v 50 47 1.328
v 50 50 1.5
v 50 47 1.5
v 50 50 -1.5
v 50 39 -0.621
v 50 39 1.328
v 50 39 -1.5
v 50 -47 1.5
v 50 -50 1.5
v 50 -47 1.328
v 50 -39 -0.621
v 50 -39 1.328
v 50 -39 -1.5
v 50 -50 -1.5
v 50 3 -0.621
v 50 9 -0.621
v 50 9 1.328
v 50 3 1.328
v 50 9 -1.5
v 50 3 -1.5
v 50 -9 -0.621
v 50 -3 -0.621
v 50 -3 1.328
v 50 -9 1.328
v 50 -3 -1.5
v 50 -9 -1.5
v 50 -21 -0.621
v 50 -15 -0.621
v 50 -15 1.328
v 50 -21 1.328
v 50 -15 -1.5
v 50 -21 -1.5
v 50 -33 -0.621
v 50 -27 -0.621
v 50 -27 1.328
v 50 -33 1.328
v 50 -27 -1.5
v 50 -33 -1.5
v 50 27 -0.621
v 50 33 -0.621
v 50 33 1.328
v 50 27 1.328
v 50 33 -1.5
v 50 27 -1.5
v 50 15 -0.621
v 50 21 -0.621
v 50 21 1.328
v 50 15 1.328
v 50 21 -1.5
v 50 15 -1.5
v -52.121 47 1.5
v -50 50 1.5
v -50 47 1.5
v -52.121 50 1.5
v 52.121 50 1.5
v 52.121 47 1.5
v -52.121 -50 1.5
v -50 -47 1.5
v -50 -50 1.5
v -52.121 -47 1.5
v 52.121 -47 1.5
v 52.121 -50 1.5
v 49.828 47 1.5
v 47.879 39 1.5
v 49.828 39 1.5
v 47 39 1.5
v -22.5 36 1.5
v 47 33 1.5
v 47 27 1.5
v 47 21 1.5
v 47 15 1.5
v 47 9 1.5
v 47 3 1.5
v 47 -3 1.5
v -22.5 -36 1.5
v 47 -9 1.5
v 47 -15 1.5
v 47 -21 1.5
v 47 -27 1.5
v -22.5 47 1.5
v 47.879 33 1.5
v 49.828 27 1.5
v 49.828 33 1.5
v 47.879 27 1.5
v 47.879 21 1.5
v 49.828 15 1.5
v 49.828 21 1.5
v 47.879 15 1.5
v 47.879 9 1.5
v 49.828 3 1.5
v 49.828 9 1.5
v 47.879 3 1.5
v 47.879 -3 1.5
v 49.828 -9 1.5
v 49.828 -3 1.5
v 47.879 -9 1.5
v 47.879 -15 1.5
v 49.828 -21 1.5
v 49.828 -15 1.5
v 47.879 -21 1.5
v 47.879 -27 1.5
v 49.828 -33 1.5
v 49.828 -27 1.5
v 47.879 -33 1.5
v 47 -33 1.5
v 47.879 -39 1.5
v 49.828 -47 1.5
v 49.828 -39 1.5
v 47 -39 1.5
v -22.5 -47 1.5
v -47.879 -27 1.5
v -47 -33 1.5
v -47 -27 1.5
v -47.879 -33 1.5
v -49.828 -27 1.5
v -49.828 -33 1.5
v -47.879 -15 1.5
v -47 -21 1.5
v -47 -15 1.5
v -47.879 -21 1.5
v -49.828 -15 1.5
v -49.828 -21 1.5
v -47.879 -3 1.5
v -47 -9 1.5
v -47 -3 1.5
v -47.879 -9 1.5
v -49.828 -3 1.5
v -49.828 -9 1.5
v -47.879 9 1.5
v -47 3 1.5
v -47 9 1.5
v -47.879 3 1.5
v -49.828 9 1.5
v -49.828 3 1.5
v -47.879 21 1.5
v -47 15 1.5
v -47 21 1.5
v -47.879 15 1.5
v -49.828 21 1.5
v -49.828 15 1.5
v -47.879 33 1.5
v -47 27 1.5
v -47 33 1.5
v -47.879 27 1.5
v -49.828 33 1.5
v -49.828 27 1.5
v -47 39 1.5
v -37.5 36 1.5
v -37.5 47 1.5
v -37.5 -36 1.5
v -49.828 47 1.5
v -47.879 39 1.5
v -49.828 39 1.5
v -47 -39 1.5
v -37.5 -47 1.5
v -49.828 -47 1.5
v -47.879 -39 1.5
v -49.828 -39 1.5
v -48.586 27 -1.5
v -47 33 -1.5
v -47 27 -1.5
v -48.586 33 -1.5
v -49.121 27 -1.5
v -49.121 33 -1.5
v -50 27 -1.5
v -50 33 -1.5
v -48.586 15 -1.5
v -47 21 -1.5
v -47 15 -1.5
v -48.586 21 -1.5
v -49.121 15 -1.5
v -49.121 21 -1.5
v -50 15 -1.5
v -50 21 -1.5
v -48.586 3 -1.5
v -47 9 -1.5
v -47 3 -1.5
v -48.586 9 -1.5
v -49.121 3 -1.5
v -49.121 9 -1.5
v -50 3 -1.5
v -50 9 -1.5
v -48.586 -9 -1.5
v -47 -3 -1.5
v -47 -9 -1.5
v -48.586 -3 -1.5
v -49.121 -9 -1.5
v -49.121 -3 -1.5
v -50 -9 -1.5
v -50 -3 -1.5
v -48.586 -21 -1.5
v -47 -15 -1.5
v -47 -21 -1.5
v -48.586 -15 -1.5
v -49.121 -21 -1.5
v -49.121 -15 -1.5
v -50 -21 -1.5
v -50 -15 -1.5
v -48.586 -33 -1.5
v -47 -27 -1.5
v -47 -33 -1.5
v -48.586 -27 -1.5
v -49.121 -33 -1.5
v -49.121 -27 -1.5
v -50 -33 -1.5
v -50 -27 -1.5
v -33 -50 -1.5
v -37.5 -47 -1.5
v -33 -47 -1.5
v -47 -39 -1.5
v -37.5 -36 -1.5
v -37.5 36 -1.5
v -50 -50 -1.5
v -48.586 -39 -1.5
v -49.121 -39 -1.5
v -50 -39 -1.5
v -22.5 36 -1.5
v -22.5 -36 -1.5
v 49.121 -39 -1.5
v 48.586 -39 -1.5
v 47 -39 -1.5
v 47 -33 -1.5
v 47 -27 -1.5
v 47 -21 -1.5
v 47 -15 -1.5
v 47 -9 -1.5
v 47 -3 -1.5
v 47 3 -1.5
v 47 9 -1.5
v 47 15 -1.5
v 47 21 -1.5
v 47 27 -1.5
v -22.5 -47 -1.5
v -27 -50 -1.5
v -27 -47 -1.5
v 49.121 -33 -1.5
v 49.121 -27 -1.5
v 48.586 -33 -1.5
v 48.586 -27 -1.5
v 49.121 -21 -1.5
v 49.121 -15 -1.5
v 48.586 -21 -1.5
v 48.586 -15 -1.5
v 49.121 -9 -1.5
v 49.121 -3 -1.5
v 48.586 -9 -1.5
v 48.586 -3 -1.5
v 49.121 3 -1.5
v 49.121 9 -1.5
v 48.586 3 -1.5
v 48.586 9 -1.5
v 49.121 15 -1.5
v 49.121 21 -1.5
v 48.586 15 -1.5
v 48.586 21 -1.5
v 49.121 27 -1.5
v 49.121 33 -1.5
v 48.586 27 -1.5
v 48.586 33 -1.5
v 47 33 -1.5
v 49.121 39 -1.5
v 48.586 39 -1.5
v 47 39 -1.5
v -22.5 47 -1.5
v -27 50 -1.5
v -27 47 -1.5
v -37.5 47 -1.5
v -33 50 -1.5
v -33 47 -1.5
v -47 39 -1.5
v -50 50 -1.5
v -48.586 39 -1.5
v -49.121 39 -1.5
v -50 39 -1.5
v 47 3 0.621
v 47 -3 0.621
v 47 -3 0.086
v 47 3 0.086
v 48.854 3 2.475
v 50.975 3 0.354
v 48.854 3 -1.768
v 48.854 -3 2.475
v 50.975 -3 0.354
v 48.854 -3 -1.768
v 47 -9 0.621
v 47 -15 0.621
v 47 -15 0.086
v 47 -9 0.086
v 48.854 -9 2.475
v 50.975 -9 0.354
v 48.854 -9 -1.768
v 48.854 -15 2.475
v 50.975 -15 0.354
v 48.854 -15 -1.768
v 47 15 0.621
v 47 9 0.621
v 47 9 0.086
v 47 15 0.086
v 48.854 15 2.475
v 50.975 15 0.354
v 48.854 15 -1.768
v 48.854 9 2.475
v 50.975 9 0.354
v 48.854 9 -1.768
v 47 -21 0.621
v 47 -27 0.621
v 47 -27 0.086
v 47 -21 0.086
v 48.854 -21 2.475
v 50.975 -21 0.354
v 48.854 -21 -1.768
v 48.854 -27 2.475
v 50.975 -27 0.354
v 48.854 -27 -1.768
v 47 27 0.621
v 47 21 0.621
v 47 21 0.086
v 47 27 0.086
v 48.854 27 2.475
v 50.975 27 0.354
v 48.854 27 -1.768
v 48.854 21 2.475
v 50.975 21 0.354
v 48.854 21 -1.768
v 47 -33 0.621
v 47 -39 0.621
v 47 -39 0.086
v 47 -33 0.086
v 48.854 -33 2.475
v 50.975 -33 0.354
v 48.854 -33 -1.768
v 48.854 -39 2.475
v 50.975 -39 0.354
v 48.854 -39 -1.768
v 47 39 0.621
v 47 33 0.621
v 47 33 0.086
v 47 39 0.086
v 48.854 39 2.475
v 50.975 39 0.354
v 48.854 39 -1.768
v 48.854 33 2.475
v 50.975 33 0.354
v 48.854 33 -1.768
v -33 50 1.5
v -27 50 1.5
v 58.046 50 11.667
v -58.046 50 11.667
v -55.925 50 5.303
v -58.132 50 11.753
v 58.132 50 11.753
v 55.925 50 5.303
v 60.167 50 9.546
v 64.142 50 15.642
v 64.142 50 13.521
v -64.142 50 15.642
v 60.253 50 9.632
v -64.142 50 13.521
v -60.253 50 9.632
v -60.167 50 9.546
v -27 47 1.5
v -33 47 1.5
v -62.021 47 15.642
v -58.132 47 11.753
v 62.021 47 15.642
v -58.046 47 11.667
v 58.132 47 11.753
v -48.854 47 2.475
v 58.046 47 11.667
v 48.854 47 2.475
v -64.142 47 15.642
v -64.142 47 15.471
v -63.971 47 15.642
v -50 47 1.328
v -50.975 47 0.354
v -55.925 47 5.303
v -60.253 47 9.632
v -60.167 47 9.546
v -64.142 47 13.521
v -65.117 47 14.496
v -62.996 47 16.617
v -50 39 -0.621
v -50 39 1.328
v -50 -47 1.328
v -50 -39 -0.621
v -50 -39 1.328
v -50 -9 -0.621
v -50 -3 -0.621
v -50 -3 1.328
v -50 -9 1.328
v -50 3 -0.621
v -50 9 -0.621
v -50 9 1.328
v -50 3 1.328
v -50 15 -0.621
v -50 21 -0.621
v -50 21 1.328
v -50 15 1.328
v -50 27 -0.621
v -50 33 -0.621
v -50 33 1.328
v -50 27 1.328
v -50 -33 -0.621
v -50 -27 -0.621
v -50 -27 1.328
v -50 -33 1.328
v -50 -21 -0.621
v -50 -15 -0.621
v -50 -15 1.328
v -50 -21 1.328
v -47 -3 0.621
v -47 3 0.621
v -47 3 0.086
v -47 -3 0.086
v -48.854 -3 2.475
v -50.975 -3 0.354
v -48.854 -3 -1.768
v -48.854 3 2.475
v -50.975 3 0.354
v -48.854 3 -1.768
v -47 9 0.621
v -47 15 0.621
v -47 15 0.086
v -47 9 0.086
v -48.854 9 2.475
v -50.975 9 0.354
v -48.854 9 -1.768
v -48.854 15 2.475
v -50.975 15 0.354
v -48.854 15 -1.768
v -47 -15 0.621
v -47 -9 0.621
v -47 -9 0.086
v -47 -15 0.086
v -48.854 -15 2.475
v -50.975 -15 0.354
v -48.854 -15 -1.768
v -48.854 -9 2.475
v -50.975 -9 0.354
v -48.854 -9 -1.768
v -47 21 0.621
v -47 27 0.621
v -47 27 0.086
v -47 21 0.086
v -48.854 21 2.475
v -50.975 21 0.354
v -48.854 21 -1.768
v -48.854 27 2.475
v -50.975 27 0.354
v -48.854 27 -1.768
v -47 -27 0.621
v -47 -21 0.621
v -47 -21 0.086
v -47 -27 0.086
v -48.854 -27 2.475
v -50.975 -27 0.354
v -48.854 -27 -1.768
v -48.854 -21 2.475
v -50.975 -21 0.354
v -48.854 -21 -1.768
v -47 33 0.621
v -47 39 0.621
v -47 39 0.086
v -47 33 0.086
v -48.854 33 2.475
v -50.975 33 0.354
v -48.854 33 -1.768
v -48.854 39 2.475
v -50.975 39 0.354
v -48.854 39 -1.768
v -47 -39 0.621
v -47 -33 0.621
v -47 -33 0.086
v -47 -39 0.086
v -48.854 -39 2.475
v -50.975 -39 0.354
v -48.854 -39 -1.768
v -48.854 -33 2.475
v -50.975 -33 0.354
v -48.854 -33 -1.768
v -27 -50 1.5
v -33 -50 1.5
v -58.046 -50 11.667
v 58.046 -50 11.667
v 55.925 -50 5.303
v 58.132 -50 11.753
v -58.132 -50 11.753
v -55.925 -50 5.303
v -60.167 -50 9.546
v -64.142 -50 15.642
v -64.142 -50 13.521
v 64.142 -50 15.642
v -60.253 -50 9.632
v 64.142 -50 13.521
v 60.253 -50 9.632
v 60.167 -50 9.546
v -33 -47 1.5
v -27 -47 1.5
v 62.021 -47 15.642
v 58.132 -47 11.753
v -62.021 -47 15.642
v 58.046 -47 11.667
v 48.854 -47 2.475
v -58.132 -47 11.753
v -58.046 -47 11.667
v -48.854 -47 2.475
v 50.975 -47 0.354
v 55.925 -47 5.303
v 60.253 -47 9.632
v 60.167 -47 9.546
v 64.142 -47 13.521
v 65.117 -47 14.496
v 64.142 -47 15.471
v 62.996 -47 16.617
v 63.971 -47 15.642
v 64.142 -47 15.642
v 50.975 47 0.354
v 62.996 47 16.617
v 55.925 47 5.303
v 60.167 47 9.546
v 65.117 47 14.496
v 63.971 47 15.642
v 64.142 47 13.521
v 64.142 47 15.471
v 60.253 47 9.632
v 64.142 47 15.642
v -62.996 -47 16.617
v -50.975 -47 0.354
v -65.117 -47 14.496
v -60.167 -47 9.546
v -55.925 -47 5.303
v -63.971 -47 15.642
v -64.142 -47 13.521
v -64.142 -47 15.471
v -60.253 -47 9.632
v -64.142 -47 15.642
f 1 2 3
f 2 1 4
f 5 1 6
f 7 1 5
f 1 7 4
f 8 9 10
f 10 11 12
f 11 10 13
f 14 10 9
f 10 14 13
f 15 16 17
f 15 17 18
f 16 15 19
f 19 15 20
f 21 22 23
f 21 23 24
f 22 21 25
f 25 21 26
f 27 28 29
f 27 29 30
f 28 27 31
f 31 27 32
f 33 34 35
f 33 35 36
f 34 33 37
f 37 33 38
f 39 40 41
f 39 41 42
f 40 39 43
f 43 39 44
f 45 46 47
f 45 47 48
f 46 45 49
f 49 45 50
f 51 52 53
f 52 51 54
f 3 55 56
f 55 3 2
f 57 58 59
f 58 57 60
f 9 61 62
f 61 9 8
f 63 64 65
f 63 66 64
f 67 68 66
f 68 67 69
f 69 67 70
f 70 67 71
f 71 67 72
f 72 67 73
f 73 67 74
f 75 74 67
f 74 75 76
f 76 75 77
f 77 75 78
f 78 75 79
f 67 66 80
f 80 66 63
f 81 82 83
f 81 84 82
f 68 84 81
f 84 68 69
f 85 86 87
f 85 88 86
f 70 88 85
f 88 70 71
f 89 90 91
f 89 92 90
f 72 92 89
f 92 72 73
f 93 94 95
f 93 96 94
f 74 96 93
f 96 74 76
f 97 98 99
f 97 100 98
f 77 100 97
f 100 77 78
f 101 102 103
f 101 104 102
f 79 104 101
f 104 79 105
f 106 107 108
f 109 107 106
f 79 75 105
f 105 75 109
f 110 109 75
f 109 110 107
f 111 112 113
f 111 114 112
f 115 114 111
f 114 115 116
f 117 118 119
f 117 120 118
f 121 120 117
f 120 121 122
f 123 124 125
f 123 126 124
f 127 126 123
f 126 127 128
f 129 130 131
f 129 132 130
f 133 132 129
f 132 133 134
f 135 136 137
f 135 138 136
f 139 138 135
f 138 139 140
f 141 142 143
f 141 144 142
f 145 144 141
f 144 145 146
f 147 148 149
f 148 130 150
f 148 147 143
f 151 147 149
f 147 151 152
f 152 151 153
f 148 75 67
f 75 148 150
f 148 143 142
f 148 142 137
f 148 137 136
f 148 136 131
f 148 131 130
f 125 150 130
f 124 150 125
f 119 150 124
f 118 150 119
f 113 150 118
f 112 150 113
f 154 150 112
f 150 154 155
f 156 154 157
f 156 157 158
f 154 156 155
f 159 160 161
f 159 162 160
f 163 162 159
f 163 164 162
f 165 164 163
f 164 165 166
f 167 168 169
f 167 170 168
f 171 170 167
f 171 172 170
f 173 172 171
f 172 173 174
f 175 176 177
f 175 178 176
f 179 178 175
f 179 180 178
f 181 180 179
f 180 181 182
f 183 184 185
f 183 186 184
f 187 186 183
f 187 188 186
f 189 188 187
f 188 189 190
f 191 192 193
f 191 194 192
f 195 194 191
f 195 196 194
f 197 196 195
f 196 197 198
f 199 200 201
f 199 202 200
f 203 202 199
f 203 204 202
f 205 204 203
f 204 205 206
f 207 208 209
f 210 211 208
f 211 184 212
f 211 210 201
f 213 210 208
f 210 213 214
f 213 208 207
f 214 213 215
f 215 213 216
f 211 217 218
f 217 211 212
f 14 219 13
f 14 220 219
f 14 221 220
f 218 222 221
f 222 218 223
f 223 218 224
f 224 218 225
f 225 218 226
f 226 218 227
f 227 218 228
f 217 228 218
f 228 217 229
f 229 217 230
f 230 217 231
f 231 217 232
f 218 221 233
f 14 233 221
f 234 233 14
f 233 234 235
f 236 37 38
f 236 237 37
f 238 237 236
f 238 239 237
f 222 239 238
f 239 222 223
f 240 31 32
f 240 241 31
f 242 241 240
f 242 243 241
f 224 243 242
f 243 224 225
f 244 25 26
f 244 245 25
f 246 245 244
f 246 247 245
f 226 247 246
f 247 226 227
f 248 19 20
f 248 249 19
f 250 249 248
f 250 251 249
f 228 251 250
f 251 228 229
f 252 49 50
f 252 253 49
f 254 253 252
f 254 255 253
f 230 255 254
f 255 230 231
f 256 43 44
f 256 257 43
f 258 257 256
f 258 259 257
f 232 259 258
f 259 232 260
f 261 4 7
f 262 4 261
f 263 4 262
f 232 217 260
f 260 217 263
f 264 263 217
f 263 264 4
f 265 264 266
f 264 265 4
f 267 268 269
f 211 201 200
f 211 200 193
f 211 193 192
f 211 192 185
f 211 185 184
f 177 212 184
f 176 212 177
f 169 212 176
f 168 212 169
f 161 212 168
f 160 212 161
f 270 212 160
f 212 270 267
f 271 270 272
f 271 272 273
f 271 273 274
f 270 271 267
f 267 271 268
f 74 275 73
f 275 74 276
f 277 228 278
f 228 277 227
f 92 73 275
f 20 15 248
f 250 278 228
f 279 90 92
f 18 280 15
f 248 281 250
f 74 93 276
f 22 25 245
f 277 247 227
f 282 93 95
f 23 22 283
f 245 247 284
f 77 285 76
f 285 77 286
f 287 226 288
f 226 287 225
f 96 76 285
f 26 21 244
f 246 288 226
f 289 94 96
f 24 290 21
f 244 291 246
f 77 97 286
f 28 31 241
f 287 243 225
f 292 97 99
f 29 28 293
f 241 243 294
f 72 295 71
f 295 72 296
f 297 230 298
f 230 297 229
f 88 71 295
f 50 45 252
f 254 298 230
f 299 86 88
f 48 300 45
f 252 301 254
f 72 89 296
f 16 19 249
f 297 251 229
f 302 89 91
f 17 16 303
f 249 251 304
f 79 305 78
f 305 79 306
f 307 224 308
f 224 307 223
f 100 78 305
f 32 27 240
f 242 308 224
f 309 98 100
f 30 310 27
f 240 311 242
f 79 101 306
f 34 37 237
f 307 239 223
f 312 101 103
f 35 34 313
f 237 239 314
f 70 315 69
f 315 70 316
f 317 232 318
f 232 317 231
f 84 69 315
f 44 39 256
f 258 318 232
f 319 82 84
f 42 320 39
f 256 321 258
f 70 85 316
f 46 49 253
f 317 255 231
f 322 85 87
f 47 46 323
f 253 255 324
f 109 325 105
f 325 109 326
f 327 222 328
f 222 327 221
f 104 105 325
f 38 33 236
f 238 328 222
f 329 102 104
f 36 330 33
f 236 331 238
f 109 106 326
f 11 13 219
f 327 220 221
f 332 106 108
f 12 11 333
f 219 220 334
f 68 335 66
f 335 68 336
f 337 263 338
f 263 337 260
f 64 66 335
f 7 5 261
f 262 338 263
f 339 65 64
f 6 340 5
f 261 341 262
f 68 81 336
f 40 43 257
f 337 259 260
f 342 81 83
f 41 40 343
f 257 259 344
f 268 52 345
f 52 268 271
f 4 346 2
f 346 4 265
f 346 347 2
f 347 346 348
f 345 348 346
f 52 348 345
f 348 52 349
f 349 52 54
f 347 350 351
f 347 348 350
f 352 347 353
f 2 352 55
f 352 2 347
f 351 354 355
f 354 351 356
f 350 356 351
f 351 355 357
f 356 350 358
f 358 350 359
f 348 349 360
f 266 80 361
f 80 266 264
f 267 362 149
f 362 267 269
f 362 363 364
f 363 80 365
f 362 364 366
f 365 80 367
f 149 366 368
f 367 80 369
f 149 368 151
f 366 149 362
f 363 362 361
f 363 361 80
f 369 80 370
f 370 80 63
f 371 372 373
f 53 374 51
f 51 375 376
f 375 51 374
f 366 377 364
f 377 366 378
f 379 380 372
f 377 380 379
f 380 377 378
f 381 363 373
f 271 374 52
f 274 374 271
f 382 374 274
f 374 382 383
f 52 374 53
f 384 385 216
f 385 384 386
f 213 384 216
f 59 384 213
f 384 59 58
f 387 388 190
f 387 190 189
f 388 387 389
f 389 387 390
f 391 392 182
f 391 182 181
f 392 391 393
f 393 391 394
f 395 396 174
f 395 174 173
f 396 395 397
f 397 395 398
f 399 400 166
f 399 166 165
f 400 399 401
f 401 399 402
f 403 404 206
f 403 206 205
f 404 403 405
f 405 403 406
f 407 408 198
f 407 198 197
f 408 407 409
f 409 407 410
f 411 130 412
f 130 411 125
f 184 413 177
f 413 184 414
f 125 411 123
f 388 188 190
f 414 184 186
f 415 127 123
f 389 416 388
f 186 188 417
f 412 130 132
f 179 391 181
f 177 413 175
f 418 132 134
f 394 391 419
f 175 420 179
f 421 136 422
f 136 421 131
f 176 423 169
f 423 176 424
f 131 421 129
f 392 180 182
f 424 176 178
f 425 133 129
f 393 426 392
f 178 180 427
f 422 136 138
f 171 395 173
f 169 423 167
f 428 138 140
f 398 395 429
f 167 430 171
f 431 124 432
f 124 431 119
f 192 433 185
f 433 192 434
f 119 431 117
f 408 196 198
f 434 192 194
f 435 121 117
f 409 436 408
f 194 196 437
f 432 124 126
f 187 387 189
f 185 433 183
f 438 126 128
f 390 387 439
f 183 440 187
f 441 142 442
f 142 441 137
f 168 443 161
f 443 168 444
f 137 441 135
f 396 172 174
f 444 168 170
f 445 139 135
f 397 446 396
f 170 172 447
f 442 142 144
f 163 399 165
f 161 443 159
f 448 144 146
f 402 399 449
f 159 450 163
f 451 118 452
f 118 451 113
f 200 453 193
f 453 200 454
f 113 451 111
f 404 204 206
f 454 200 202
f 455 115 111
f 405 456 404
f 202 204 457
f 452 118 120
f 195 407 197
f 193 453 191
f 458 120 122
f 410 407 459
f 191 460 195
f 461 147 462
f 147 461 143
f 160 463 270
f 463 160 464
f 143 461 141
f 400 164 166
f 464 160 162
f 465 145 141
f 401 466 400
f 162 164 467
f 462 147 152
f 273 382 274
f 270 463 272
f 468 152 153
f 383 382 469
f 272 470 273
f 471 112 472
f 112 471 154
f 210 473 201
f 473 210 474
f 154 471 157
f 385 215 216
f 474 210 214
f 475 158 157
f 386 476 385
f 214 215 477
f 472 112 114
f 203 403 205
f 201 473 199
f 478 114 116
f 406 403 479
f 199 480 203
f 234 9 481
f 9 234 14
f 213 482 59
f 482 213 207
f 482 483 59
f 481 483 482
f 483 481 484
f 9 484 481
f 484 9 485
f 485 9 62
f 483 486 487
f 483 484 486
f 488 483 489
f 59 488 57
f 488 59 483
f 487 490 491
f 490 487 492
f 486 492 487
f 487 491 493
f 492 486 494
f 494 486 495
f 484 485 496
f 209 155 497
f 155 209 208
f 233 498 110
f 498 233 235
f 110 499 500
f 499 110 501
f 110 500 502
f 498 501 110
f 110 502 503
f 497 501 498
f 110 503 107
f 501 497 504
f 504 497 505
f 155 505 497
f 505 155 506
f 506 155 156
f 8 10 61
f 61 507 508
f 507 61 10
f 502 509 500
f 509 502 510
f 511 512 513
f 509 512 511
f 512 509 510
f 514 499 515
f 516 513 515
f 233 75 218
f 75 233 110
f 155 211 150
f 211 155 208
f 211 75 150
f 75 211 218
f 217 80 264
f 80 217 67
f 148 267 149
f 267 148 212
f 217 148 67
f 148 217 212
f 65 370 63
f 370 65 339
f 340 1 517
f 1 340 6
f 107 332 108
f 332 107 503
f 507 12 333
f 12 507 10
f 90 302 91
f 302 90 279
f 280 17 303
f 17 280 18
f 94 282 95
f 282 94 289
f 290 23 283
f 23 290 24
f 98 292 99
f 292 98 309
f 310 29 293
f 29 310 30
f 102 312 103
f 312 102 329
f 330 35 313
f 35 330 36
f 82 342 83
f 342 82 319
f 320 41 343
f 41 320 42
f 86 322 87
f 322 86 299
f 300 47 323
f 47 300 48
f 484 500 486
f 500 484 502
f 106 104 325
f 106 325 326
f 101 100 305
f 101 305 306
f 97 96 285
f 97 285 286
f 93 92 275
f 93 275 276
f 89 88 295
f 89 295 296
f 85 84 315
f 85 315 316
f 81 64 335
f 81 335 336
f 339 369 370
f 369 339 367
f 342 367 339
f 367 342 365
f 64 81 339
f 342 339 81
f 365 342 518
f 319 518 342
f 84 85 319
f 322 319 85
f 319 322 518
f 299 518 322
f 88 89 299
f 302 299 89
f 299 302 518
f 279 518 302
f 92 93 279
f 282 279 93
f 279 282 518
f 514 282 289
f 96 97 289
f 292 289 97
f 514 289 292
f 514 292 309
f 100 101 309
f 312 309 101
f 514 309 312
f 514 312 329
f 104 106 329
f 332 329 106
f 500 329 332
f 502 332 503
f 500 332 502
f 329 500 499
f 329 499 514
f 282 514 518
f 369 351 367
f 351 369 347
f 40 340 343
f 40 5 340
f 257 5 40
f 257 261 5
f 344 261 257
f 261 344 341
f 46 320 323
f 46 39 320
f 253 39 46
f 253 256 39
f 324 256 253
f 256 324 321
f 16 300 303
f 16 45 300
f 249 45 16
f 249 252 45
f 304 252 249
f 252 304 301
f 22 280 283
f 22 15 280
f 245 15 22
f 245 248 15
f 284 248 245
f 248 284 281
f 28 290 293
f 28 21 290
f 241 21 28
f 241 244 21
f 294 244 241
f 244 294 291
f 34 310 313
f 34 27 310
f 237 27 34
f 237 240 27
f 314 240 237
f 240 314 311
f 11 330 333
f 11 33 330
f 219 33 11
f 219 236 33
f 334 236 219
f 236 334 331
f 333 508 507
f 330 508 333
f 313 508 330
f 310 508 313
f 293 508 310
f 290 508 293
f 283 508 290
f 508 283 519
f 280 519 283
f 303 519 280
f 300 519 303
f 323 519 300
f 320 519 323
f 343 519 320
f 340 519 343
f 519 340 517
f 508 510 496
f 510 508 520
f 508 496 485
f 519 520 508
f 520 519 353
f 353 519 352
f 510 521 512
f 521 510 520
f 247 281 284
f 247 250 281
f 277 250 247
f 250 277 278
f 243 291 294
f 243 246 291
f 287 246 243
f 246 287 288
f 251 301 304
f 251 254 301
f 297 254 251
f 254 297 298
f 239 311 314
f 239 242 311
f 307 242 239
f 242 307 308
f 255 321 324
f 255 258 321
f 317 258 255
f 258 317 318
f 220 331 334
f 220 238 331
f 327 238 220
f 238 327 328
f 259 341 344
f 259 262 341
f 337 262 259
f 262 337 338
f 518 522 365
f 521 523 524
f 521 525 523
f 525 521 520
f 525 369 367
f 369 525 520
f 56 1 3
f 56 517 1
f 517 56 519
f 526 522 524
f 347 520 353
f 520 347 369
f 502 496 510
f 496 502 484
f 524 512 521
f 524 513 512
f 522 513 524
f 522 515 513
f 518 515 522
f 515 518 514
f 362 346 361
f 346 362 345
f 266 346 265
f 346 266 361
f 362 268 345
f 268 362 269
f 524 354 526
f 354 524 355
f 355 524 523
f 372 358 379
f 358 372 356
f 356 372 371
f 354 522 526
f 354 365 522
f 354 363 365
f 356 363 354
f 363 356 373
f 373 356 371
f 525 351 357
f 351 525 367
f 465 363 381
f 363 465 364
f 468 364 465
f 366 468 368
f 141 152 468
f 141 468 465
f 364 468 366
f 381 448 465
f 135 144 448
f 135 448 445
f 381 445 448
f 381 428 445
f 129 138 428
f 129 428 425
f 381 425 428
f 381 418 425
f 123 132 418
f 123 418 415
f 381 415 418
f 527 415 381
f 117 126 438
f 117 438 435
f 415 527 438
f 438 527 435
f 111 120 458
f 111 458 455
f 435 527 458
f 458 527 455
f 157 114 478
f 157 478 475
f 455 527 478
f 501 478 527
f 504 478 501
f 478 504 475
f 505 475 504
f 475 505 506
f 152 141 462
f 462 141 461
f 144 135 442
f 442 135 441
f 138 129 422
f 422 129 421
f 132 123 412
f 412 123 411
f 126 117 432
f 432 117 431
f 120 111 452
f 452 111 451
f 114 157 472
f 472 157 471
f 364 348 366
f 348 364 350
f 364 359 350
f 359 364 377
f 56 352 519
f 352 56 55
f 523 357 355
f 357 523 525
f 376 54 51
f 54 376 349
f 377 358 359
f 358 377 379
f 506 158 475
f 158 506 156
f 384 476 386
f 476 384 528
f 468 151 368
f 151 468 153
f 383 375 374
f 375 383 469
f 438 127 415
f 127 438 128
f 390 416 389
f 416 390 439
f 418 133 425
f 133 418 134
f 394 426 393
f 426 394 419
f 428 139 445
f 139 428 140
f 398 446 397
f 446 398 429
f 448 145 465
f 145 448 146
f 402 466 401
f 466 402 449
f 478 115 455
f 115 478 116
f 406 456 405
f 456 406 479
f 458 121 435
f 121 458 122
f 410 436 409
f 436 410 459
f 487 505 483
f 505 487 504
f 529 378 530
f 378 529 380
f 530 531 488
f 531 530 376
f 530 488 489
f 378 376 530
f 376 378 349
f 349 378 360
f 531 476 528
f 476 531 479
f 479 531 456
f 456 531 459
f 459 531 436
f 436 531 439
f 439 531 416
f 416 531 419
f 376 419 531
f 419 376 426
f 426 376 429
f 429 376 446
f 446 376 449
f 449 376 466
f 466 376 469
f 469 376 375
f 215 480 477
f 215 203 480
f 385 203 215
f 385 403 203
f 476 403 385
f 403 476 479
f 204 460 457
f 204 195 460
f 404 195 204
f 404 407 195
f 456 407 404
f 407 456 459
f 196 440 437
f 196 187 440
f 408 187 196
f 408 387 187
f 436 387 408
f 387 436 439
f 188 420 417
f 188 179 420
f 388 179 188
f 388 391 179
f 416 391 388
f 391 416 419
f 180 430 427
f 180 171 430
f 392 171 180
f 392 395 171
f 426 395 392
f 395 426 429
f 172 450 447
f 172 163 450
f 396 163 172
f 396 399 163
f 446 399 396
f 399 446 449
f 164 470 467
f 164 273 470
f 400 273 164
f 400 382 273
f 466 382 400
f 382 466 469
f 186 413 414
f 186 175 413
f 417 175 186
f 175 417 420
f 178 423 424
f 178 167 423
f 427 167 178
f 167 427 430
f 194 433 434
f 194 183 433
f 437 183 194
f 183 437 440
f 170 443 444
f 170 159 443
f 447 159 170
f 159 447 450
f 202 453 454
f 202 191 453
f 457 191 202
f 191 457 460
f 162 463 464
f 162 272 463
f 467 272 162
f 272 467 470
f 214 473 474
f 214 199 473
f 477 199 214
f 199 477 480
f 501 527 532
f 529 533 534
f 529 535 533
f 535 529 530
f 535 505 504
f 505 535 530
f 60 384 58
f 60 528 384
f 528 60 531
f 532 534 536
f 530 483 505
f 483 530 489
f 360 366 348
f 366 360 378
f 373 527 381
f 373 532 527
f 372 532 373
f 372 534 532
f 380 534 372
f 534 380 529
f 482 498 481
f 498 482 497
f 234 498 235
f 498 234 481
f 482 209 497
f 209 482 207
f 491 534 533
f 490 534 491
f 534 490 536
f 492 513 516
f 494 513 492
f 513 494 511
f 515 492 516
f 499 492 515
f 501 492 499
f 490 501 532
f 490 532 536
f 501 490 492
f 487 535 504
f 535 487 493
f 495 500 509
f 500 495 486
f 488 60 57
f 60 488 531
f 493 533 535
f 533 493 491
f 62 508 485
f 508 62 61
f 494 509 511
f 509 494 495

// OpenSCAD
IN_MM = 25.4;

th = 3;
frame_l = 100;
flap_w = 20;
wing_l = frame_l / 2;
corner_r = 5;
hole_ir = 3/2;
FOLD_DEG = 45;

mesh_hole = 10;
mesh_wall = 3;
mesh_dx = 1.5 * mesh_hole + mesh_wall;
mesh_dy = mesh_hole * cos(30) + mesh_wall;

chain_h = 11; // at smallest point
chain_w = 15; 

num_frames = 18;

finger_l = 3;
finger_w = 6;

m3_d = 2.5;
m3_w = 5.5;

module mesh() {
    difference() {
        square([frame_l - finger_l*2, frame_l - finger_l*2], center=true);
        for (x=[
                -frame_l/2:
                mesh_dx:
                frame_l/2 + mesh_dx]) {
            for (y=[
                    -frame_l/2:
                    mesh_dy:
                    frame_l/2 + mesh_dy]) {
                translate([x, y, 0]) {
                    // % cube([mesh_hole, mesh_hole, 2*th], center=true);
                    circle(r=mesh_hole/2, $fn=6);
                }
                translate([
                        x + mesh_dx/2, 
                        y - mesh_dy/2, 0]) {
                    circle(r=mesh_hole/2, $fn=6);
                    // % cube([mesh_hole, mesh_hole, 2*th], center=true);
                }
            }
        }
        projection()
            offs_chain_holes();
    }
}

// ! mesh();

module evolution_1() {
    scale([0.175, 0.175, 1.1])
    linear_extrude(th, center=true)
        translate([-820, -500])
        import("evolution_1b.dxf");
}

// evolution_1();

module evolution_2() {
    scale([0.1, 0.08, 1.1])
    rotate([0, 0, 40])
    linear_extrude(th, center=true)
        translate([-700, -420])
        import("evolution_2c.dxf");
}

// evolution_2();

module evolution_3() {
    scale([0.125, 0.125, 1.1])
    linear_extrude(th+1, center=true)
        translate([-820, -480])
        import("evolution_3b.dxf");
}

// ! projection() evolution_3();

module evolution_4() {
    scale([0.175, 0.175, 1.1])
    linear_extrude(th, center=true)
        translate([-830, -480])
        import("evolution_4b.dxf");
}

// ! evolution_4();

module evolution_4_5() {
    scale([0.25, 0.25, 1.1])
    linear_extrude(th, center=true)
        translate([-230, -200])
        import("evolution_4_5.dxf");
}

// ! evolution_4_5();

module evolution_5() {
    scale([0.15, 0.15, 1.1])
    linear_extrude(th, center=true)
        translate([-830, -460])
        import("evolution_5b.dxf");
}

// ! evolution_5();

module evolution_5_5() {
    scale([0.2, 0.2, 1.1])
    linear_extrude(th, center=true)
        translate([-150, -260])
        import("evolution_5_5.dxf");
}

// ! evolution_5_5();

module evolution_6() {
    scale([0.09, 0.09, 1.1])
    linear_extrude(th, center=true)
        translate([-820, -500])
        import("evolution_6b.dxf");
}

// ! evolution_6();

module evolution_7() {
    scale([0.08, 0.08, 1.1])
    linear_extrude(th, center=true)
        translate([-850, -500])
        import("evolution_7b.dxf");
}

// ! evolution_7();

module evolution_7_5() {
    scale([0.115, 0.115, 1.1])
    linear_extrude(th, center=true)
        translate([-420, -200])
        import("evolution_7_5.dxf");
}

// ! evolution_7_5();

module evolution_8() {
    scale([0.07, 0.07, 1.1])
    linear_extrude(th, center=true)
        translate([-850, -500])
        import("evolution_8b.dxf");
}

// ! evolution_8();

module evolution_9() {
    scale([0.075, 0.075, 1.1])
    linear_extrude(th, center=true)
        translate([-800, -500])
        import("evolution_9.dxf");
}

// ! evolution_9();

module evolution_10() {
    scale([0.09, 0.09, 1.1])
    linear_extrude(th, center=true)
        translate([-820, -500])
        import("evolution_10b.dxf");
}

// ! evolution_10();

module evolution_10_5() {
    scale([0.12, 0.12, 1.1])
    linear_extrude(th, center=true)
        translate([-440, -250])
        import("evolution_10_5.dxf");
}

// ! evolution_10_5();

module evolution_11() {
    scale([0.125, 0.125, 1.1])
    linear_extrude(th, center=true)
        translate([-820, -550])
        import("evolution_11b.dxf");
}

// ! evolution_11();

module evolution_12() {
    scale([0.07, 0.07, 1.1])
    linear_extrude(th, center=true)
        translate([-840, -500])
        import("evolution_12b.dxf");
}

// evolution_12();

module evolution_13() {
    scale([0.1, 0.1, 1.1])
    linear_extrude(th, center=true)
        translate([-820, -475])
        import("evolution_13d.dxf");
}

// evolution_13();

module evolution_14() {
    scale([0.12, 0.12, 1.1])
    linear_extrude(th, center=true)
        translate([-840, -450])
        import("evolution_14b.dxf");
}

// evolution_14();

module get_dxf(f=1) {
    if (f <= 1)
        evolution_1();
    else if (f <= 2)
        evolution_2();
    else if (f <= 3)
        evolution_3();
    else if (f <= 4)
        evolution_4();
    else if (f <= 4.5)
        evolution_4_5();
    else if (f <= 5)
        evolution_5();
    else if (f <= 5.5)
        evolution_5_5();
    else if (f <= 6)
        evolution_6();
    else if (f <= 7)
        evolution_7();
    else if (f <= 7.5)
        evolution_7_5();
    else if (f <= 8)
        evolution_8();
    else if (f <= 9)
        evolution_9();
    else if (f <= 10)
        evolution_10();
    else if (f <= 10.5)
        evolution_10_5();
    else if (f <= 11)
        evolution_11();
    else if (f <= 12)
        evolution_12();
    else if (f <= 13)
        evolution_13();
    else if (f <= 14)
        evolution_14();
    
}

// get_dxf();

// module flap_holes() {
//     // for (x=[flap_w:flap_w:wing_l - flap_w]) {
//     translate([wing_l - flap_w/2, flap_w/2, 0])
//         cylinder(r=hole_ir, h=2*th, center=true, $fn=64);
//     // }
// }

// module frame_wing_flap(fold_deg=FOLD_DEG) {
//     flap_deg = fold_deg == 0 ? 0 : 35;
//     difference() {
//         translate([0, 0, -th/2])
//             cube([wing_l, frame_l, th], center=false);
//         translate([0, 0, -th])
//             rotate([0, 0, 60])
//             cube([wing_l*2, frame_l, th*2], center=false);
//         translate([wing_l, 0, -th])
//             rotate([0, 0, 30])
//             cube([wing_l*2, frame_l*2, th*2], center=false);
//     }
//     rotate([flap_deg, 0, 60])
//         difference() {
//             translate([0, 0, -th/2])
//                 cube([wing_l, flap_w, th], center=false);
//             rotate([0, 0, 30])
//                 translate([0, -1, -th])
//                 cube([wing_l, flap_w, 2*th], center=false);
            
//             for (x=[20:20:wing_l]) {
//                 translate([x, 0, -th])
//                 cube([5, 1, th * 2]);
//             }
//             flap_holes();
//             // # rotate([0, 0, 0])
//             //     cube([chain_w, chain_h, 100], center=true);
//         }
    
// }

// ! frame_wing_flap();
// ! frame_wing_flap(fold_deg=0);

// module frame_wing_folded(fold_deg=FOLD_DEG) {
//     wing_deg = fold_deg == 0 ? 0 : 35;
//     difference() {
//         translate([0, 0, -th/2])
//             cube([wing_l, frame_l, th], center=false);
//         flap_holes();
//         for (y=[20:20:frame_l]) {
//             translate([0, y, -th])
//             cube([1, 5, th * 2]);
//         }
//         for (x=[20:20:wing_l]) {
//             translate([x, frame_l - 1, -th])
//                 cube([5, 1, th * 2]);
//         }
//     }
//     translate([0, frame_l, 0])
//         rotate([wing_deg, 0, 0])
//         frame_wing_flap(fold_deg=fold_deg);
// }

// ! frame_wing_folded();
// ! frame_wing_folded(fold_deg=0);

module fingers(l=frame_l/2 - finger_w * 2) {
    for (y=[
            0:
            2 * finger_w:
            l]) {
        for (i=[-1, 1])
            translate([0, i * y, 0])
                cube([finger_l, finger_w, th], center=true);
    }
}

module frame_fingers() {
    for (r=[0:90:359]) {
        rotate([0, 0, r])
            translate([frame_l/2 - finger_l/2, 0, 0])
            fingers();
    }
}

module chain_holes() {
    for (i=[-1, 1, -1.2, 1.2])
        translate([0, i * (frame_l/2 - chain_h/2 - finger_l), 0])
        cube([chain_w, chain_h, th], center=true);
}

module frame_wing() {
    fingers();
    translate([finger_l/2 + flap_w/2, 0, 0])
        cube([flap_w, frame_l - finger_l*2, th], center=true);

    translate([finger_l/2 + flap_w/2, frame_l / 2 - finger_l/2, 0])
        rotate([0, 0, 90])
        fingers(flap_w - finger_w * 2);
    translate([finger_l/2 + flap_w/2, -frame_l / 2 + finger_l/2, 0])
        rotate([0, 0, 90])
        fingers(flap_w - finger_w * 2);
}

// ! projection()
    // frame_wing();

module frame_cap() {
    difference() {
        union() {
            rotate([0, 0, 90])
                fingers();
            translate([0, finger_l/2 + flap_w/ sqrt(2)/2, 0])
                cube([
                    frame_l + flap_w * sqrt(2), 
                    flap_w / sqrt(2), th], center=true);
        }
        translate([frame_l/2 + th / sqrt(2), finger_l/2, -th])
            rotate([0, 0, -45])
            cube([flap_w*2, flap_w*2, th*2]);
        translate([
                frame_l/2 + flap_w * sqrt(2)/4, 
                finger_l/2 + flap_w * sqrt(2)/4, 0])
            rotate([0, 0, -45])
            fingers(flap_w - finger_w * 2);
        

        translate([
                -frame_l/2 - th / sqrt(2), 
                finger_l/2, -th])
            rotate([0, 0, 135])
            cube([flap_w*2, flap_w*2, th*2]);
        translate([
                -frame_l/2 - flap_w * sqrt(2)/4, 
                finger_l/2 + flap_w * sqrt(2)/4, 0])
            rotate([0, 0, 45])
            fingers(flap_w - finger_w * 2);
    }
}

// ! projection()
    // frame_cap();

module offs_chain_holes() {
    translate([-frame_l/2 + flap_w, 0, 0])
        chain_holes();
}

module frame_base() {
    difference() {
        cube([frame_l, frame_l, th], center=true);
        frame_fingers();
        offs_chain_holes();
    }
}

// ! frame_base();

module frame_folded(fold_deg=FOLD_DEG) {
    frame_base();
    if (fold_deg != 0) {
    for (r=[0, 180])
        rotate([0, 0, r]) {
            translate([frame_l/2 - finger_l/2 + 0, 0, 0])
                rotate([0, -fold_deg, 0])
                translate([0.5, 0, 0])
                frame_wing();
            translate([0, frame_l/2 - finger_l/2, 0])
                rotate([2 * fold_deg, 0, 0])
                frame_cap();
        }
    }
}

frame_folded();
// frame_folded(fold_deg=0);

module stock_panel() {
    % translate([-3 * IN_MM, -3 * IN_MM, -1/16 * IN_MM])
        cube([12 * IN_MM, 12 * IN_MM, 1/8 * IN_MM]);
}

// stock_panel();

module plate_frame(f=1) {
    difference() {
        projection()
            frame_folded(fold_deg=0);
        projection()
            get_dxf(f);
    }
    // projection()
        mesh();
}

// plate_frame(12);

// plate_frame($t * num_frames);

module plate_all() {
    plate_frame(1);
    translate([
            (frame_l + wing_l * 2 + 1), 0, 0])
        plate_frame(2);
    translate([
            2 * (frame_l + wing_l * 2 + 1), 0, 0])
        plate_frame(3);
    translate([
            3 * (frame_l + wing_l * 2 + 1), 0, 0])
        plate_frame(4);
    translate([0, 
            (frame_l + wing_l * 2 + 1), 0])
        plate_frame(4.5);
    translate([(frame_l + wing_l * 2 + 1), 
            (frame_l + wing_l * 2 + 1), 0])
        plate_frame(5);
    translate([2 * (frame_l + wing_l * 2 + 1), 
            (frame_l + wing_l * 2 + 1), 0])
        plate_frame(5.5);
    translate([3 * (frame_l + wing_l * 2 + 1), 
            (frame_l + wing_l * 2 + 1), 0])
        plate_frame(6);
    translate([0, 
            2 * (frame_l + wing_l * 2 + 1), 0])
        plate_frame(7);
    translate([(frame_l + wing_l * 2 + 1), 
            2 * (frame_l + wing_l * 2 + 1), 0])
        plate_frame(7.5);
    translate([2 * (frame_l + wing_l * 2 + 1), 
            2 * (frame_l + wing_l * 2 + 1), 0])
        plate_frame(8);
    translate([3 * (frame_l + wing_l * 2 + 1), 
            2 * (frame_l + wing_l * 2 + 1), 0])
        plate_frame(9);
    translate([0, 
            3 * (frame_l + wing_l * 2 + 1), 0])
        plate_frame(10);
    translate([(frame_l + wing_l * 2 + 1), 
            3 * (frame_l + wing_l * 2 + 1), 0])
        plate_frame(10.5);
    translate([2 * (frame_l + wing_l * 2 + 1), 
            3 * (frame_l + wing_l * 2 + 1), 0])
        plate_frame(11);
    translate([3 * (frame_l + wing_l * 2 + 1), 
            3 * (frame_l + wing_l * 2 + 1), 0])
        plate_frame(12);
    translate([0, 
            4 * (frame_l + wing_l * 2 + 1), 0])
        plate_frame(13);
    translate([(frame_l + wing_l * 2 + 1), 
            4 * (frame_l + wing_l * 2 + 1), 0])
        plate_frame(14);
    
    
    
}

// plate_all();
